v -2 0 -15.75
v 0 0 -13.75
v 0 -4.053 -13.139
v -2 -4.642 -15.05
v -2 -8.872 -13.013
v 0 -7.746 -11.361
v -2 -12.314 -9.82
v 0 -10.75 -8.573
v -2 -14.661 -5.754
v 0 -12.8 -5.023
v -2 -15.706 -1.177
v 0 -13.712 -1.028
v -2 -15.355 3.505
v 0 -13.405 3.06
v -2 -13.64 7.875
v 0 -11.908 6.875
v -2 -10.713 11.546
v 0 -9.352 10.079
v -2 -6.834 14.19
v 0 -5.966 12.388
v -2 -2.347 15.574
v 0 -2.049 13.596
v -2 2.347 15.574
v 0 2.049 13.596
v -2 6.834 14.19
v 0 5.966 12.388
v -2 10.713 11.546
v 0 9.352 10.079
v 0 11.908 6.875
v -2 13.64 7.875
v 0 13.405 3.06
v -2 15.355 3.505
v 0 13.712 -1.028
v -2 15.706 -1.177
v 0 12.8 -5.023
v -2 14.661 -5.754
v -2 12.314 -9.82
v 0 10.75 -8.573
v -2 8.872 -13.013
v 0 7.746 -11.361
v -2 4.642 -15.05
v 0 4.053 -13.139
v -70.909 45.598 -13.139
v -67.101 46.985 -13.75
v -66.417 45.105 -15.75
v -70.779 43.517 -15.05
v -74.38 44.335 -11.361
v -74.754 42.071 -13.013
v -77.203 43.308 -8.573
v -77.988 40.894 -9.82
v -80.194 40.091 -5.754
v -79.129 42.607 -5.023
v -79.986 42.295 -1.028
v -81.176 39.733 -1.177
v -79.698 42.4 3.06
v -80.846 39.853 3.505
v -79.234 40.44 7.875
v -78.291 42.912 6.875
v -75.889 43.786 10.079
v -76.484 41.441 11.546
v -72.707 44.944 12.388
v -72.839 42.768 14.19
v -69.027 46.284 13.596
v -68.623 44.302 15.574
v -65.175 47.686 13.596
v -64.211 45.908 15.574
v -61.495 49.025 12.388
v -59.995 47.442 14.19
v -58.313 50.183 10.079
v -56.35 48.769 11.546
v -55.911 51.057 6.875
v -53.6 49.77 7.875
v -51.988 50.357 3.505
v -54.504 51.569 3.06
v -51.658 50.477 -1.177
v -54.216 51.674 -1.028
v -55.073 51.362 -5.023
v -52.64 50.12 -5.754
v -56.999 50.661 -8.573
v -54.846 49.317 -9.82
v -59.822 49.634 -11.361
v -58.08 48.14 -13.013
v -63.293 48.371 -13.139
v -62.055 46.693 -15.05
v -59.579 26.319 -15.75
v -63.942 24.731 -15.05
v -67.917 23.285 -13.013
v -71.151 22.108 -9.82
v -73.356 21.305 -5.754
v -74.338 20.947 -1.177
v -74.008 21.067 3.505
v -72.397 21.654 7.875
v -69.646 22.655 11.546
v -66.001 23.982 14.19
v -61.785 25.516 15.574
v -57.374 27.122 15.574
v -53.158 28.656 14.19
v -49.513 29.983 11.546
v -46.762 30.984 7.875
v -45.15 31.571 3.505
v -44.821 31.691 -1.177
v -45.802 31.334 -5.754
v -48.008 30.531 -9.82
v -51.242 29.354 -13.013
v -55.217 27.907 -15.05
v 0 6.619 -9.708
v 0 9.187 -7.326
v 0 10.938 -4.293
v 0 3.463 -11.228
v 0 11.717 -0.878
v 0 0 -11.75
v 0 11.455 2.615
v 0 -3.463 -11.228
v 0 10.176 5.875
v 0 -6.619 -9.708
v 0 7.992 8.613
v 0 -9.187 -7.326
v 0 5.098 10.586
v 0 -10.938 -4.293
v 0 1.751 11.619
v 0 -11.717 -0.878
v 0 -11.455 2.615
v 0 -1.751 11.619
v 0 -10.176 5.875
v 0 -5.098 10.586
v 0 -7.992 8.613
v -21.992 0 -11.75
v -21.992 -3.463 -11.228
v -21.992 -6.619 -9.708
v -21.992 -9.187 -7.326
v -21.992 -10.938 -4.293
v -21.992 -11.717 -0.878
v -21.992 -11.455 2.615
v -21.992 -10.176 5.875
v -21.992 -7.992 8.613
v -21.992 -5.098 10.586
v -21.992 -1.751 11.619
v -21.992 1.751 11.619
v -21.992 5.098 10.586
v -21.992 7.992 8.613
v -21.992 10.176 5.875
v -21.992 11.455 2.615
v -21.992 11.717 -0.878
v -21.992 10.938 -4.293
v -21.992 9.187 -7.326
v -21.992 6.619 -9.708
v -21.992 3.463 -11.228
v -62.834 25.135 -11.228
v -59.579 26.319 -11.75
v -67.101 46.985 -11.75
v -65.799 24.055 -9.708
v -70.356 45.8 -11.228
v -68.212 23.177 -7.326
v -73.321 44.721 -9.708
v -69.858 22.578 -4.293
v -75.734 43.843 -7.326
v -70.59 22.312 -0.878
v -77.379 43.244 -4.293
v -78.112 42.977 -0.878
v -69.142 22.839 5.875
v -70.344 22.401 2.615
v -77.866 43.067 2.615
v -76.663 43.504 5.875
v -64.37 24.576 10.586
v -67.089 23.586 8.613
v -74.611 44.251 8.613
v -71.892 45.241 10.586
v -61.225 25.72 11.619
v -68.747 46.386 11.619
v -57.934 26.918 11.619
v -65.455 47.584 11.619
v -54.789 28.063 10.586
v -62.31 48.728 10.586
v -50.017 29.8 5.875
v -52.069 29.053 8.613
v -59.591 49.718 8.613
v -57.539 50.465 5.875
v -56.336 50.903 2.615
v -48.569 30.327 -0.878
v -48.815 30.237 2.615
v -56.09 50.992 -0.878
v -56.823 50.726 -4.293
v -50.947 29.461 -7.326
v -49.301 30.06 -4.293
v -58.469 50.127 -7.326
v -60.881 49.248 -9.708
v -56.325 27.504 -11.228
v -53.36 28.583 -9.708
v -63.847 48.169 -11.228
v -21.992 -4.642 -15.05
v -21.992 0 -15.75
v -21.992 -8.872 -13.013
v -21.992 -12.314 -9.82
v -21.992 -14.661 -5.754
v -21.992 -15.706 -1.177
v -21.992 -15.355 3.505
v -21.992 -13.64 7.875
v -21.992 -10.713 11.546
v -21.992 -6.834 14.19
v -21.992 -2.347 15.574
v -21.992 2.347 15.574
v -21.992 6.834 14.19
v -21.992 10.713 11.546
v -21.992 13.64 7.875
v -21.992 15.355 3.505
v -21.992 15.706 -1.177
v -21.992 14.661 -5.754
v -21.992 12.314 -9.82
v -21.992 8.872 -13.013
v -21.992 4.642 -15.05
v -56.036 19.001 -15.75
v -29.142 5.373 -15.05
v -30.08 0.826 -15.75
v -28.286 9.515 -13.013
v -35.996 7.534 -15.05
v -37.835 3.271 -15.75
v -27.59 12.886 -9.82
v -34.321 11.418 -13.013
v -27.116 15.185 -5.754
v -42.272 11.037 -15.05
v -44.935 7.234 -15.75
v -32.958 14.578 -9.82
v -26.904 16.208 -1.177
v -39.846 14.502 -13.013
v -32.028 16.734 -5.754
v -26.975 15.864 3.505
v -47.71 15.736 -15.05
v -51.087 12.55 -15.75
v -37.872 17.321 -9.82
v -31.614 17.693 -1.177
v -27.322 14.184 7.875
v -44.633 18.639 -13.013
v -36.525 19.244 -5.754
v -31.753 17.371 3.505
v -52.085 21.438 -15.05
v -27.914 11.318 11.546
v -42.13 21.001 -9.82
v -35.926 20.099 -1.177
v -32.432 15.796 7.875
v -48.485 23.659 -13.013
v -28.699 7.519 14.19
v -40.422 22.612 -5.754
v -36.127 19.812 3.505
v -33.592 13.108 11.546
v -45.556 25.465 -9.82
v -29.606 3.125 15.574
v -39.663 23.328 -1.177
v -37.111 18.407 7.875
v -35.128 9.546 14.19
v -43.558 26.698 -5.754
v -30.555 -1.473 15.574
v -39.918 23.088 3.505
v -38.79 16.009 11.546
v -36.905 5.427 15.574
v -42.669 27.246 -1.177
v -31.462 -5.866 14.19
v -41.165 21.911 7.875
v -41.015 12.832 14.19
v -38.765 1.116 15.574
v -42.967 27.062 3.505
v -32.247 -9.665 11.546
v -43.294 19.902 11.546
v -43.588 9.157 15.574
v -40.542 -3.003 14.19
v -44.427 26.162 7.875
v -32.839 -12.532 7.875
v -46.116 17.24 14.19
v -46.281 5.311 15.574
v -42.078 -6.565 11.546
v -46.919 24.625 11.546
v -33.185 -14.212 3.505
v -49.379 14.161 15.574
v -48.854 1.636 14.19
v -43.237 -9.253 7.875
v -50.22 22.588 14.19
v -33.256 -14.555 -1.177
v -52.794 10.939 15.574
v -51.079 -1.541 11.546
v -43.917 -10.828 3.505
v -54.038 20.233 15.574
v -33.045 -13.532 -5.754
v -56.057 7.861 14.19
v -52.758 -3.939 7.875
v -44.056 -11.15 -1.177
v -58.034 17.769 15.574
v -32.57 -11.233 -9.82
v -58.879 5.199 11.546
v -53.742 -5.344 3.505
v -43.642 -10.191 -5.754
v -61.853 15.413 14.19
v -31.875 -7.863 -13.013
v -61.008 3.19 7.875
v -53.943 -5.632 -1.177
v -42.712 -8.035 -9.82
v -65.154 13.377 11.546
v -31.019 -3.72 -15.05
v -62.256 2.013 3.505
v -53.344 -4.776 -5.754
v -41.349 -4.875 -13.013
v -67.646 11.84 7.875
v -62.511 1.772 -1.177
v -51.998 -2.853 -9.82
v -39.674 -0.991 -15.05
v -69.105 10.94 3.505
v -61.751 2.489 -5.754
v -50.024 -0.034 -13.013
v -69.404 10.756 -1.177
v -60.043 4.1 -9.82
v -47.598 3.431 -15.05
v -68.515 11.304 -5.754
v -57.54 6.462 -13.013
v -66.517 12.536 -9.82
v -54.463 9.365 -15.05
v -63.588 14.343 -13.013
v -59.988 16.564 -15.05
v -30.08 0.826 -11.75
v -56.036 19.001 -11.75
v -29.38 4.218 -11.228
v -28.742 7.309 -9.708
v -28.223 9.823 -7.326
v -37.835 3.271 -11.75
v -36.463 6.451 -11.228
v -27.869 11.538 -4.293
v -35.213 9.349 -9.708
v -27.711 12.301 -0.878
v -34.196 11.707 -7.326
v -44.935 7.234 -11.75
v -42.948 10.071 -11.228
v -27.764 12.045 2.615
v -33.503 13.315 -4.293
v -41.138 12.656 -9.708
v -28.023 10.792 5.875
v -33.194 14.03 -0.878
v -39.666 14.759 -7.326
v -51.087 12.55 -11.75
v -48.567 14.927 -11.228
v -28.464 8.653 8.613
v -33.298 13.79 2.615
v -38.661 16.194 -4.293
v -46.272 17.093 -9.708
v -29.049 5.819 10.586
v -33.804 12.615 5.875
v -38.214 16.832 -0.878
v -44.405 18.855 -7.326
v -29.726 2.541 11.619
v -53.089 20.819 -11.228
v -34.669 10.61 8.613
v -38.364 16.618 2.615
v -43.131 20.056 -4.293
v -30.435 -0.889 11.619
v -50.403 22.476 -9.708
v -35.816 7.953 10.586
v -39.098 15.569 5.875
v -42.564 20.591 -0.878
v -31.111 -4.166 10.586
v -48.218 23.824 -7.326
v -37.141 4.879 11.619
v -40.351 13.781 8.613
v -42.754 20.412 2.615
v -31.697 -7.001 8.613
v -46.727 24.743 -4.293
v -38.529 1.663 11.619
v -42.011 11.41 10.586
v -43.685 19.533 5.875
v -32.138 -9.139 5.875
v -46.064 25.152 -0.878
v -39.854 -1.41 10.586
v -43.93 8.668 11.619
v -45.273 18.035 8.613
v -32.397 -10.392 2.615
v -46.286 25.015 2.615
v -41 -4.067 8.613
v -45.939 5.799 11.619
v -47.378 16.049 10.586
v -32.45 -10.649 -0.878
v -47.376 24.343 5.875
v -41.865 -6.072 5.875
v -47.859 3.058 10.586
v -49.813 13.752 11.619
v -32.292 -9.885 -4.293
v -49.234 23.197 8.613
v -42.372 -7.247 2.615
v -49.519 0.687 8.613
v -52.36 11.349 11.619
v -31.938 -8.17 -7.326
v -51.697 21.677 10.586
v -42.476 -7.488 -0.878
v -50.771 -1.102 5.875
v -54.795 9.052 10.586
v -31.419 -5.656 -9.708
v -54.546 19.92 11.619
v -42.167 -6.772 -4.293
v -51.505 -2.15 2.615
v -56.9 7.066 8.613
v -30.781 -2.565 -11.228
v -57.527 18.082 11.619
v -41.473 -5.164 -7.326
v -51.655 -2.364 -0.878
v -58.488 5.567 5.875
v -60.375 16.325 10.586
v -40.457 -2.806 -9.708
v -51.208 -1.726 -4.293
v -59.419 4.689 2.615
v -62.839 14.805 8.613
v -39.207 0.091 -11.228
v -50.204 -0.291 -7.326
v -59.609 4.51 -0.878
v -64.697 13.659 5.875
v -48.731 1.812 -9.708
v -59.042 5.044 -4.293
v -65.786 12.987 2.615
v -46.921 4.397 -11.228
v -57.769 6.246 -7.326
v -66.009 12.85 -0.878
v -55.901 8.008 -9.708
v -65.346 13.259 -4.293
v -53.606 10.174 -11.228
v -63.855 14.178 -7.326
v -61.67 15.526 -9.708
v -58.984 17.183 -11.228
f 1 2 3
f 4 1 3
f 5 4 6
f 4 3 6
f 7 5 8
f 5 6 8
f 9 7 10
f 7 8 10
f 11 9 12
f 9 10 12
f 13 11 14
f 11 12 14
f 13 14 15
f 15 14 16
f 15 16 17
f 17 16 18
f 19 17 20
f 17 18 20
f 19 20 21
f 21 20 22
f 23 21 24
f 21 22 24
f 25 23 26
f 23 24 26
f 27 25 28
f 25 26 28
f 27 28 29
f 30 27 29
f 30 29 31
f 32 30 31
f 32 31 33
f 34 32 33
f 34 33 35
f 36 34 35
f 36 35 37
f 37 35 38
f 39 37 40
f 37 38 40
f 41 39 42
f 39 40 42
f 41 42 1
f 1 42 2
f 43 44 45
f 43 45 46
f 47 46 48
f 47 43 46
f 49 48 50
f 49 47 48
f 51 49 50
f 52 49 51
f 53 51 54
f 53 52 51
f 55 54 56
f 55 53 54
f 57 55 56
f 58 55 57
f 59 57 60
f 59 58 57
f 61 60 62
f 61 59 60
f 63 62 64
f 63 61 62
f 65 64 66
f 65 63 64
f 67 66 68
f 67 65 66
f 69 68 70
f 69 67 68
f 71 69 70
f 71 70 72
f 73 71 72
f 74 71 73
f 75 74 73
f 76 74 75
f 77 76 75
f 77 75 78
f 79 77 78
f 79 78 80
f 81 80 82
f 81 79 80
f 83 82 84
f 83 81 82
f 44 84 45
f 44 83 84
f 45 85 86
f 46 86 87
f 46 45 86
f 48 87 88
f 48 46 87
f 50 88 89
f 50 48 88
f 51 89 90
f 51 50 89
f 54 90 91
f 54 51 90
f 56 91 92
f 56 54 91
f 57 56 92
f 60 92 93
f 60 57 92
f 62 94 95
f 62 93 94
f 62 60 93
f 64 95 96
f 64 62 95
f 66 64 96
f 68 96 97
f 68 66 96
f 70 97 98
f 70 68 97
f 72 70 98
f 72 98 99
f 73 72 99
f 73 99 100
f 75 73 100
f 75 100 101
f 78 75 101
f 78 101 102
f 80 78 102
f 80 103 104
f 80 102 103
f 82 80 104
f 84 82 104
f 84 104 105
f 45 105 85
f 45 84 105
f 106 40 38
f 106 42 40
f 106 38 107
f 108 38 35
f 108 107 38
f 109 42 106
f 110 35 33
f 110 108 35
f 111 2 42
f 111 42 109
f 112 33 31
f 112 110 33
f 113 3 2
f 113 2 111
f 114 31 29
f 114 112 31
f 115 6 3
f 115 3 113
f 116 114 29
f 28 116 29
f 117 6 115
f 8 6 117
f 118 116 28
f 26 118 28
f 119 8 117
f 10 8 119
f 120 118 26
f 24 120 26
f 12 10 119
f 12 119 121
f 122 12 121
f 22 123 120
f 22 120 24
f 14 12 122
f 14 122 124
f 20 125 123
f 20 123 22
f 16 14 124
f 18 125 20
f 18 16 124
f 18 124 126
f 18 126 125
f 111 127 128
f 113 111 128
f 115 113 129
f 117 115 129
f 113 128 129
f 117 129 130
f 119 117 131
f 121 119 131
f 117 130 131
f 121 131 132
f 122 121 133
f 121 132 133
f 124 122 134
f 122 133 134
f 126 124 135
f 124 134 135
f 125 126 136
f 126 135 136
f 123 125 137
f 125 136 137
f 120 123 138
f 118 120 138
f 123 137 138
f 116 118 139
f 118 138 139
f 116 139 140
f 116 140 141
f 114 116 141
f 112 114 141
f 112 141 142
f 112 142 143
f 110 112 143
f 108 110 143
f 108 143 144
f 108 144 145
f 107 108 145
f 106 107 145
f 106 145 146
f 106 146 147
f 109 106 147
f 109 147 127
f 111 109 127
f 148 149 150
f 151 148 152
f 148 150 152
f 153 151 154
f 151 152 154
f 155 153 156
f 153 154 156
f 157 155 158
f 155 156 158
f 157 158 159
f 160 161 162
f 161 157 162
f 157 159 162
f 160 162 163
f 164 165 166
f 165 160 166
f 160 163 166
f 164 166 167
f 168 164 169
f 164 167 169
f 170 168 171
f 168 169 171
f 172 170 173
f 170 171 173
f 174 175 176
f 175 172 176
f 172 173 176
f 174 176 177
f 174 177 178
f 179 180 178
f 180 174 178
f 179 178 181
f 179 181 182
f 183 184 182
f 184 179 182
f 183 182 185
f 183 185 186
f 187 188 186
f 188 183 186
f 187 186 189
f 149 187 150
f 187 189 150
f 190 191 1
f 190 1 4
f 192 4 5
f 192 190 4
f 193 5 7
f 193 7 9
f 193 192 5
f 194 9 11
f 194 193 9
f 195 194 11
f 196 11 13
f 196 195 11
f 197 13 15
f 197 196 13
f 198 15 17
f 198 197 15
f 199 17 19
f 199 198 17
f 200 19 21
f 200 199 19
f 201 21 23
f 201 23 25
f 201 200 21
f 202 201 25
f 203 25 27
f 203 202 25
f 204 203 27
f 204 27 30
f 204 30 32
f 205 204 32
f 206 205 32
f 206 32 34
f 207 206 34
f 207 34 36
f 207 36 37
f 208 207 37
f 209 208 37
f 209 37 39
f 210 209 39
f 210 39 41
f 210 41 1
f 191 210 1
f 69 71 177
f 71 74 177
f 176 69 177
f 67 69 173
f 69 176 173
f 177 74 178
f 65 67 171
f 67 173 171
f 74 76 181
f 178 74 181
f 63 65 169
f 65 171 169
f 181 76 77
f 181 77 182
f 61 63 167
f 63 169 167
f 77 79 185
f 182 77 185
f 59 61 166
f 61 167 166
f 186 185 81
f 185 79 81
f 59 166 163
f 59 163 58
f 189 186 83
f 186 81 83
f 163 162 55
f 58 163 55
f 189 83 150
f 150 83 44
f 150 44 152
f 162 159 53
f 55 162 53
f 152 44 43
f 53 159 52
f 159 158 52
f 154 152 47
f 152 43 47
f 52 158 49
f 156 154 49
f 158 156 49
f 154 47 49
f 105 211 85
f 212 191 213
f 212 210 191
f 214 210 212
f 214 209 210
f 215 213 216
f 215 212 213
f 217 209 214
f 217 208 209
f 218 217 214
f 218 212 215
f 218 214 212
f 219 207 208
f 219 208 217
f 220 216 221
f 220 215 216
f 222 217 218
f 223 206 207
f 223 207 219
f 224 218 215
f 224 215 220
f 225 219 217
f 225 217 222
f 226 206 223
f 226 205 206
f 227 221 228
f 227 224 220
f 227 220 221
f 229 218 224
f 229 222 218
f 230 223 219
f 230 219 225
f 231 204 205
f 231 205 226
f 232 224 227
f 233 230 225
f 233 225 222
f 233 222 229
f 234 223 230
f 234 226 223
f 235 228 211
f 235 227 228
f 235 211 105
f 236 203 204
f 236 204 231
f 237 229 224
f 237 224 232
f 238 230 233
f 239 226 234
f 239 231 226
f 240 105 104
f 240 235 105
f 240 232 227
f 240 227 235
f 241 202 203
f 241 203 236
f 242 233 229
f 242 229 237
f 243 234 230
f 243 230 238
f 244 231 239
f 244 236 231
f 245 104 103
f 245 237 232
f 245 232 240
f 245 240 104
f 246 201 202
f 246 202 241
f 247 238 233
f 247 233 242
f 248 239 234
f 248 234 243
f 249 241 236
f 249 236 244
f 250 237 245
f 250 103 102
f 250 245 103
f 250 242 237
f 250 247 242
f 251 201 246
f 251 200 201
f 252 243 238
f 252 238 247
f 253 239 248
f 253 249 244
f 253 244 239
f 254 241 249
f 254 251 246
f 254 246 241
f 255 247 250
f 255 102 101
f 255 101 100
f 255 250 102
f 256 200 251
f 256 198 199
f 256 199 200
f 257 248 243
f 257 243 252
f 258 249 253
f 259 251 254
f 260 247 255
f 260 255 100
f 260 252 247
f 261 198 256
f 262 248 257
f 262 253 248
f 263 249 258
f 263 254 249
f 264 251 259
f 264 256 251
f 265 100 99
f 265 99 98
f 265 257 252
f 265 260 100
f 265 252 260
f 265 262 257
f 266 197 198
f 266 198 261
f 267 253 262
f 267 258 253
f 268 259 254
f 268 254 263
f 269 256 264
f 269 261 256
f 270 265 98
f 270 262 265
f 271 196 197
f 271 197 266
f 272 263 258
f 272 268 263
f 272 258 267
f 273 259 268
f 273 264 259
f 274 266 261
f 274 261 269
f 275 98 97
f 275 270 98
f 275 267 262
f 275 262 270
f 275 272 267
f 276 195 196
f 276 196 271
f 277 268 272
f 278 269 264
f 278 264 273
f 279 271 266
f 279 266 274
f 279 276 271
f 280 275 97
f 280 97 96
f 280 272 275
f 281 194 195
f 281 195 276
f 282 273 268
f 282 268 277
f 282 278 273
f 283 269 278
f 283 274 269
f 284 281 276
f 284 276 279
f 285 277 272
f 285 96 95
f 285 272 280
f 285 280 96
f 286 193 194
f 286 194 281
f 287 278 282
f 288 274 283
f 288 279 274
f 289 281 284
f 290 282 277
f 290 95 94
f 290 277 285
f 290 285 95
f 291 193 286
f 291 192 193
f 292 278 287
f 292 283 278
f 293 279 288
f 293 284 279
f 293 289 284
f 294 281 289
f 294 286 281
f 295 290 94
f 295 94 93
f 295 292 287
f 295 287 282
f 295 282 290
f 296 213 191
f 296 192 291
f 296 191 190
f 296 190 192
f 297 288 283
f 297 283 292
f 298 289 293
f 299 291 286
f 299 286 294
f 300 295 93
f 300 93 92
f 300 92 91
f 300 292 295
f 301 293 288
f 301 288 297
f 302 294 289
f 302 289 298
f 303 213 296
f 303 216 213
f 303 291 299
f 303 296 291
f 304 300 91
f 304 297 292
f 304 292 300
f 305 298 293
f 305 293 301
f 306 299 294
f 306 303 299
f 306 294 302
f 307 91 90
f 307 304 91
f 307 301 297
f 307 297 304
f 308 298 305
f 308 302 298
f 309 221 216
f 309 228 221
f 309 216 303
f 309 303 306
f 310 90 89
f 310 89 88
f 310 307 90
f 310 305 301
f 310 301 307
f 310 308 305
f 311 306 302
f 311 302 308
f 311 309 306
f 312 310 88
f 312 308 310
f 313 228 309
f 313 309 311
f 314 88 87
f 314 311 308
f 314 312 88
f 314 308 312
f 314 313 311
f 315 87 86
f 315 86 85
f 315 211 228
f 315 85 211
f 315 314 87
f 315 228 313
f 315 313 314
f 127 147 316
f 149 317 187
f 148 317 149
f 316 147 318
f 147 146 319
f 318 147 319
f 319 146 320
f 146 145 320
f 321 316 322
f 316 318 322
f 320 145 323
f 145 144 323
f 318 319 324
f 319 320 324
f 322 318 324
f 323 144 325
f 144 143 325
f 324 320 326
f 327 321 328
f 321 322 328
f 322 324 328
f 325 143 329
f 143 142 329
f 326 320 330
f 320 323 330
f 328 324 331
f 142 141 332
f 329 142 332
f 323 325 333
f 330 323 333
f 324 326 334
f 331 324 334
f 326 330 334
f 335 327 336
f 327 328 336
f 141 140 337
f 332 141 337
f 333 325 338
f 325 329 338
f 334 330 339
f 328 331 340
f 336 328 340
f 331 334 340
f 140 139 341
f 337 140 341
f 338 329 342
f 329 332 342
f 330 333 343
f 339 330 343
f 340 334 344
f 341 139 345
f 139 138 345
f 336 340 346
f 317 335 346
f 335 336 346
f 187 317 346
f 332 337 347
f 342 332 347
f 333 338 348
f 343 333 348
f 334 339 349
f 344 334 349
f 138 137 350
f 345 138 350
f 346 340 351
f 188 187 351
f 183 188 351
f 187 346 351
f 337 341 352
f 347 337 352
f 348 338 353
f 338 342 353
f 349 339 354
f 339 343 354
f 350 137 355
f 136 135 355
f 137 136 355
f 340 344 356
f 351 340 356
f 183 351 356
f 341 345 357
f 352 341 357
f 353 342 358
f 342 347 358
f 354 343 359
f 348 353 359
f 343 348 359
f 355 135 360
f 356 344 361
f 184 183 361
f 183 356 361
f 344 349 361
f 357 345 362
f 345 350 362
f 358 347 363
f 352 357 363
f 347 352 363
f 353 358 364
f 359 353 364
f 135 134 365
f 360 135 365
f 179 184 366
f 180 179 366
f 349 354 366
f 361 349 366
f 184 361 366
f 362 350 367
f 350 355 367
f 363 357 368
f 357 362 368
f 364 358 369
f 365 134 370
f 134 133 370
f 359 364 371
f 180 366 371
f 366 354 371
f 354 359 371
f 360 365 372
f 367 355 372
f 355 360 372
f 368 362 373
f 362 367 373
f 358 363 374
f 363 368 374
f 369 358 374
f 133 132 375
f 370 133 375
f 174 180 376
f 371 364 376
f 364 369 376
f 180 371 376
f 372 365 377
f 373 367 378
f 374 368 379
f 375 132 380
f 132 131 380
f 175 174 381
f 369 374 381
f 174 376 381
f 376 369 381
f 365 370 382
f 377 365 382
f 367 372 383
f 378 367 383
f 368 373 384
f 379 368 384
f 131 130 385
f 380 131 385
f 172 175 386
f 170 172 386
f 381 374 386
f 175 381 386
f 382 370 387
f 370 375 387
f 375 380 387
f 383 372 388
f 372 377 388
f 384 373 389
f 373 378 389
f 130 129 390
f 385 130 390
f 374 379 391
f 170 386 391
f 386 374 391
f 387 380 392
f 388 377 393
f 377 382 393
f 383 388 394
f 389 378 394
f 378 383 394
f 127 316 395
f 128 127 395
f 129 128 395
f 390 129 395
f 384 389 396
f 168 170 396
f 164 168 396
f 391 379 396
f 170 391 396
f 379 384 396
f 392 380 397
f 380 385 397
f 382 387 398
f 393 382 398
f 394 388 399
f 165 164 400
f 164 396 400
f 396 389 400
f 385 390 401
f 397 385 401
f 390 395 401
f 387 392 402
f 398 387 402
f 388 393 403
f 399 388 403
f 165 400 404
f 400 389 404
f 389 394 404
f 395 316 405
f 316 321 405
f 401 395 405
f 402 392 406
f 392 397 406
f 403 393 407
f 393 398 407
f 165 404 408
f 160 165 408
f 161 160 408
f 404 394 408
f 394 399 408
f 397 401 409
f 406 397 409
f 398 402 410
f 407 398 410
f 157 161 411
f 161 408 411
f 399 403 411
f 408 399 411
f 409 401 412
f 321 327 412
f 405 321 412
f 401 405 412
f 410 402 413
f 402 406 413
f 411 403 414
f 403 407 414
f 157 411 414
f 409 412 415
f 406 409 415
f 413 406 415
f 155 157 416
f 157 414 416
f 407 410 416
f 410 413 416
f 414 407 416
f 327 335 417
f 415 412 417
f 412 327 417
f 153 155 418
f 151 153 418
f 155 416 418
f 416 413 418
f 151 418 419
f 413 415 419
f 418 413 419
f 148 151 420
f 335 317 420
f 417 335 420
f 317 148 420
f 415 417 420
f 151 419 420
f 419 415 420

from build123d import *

# Parameters (mm, degrees)
ESQUISSE2_R     = 15.75
ESQUISSE2_R_2   = 11.75
CHANFREIN1_SIZE = 2


with BuildPart() as part:
    # Balayage2: sweep along a path in Esquisse1
    with BuildLine(Plane.XY) as balayage2_path:
        Line((0, 0), (-21.991698472, 0))
        ThreePointArc((-21.991698472, 0), (-44.934755926, 7.233918228), (-59.579403303, 26.319194267))
        Line((-59.579403303, 26.319194267), (-67.101007166, 46.984631039))
    # Esquisse2 → Balayage2 (sweep)
    with BuildSketch(Plane(origin=(0, 0, 0), x_dir=(0, 0, -1), z_dir=(1, 0, 0))):
        Circle(ESQUISSE2_R)
        Circle(ESQUISSE2_R_2, mode=Mode.SUBTRACT)
    sweep(path=balayage2_path.line)

    # Chanfrein1
    chanfrein1_edges = [part.edges().sort_by_distance(p)[0] for p in [
        (-67.101007166, 46.984631039, 15.75),
        (0, 0, 15.75),
    ]]
    chamfer(chanfrein1_edges, length=CHANFREIN1_SIZE)


solid = part.part
